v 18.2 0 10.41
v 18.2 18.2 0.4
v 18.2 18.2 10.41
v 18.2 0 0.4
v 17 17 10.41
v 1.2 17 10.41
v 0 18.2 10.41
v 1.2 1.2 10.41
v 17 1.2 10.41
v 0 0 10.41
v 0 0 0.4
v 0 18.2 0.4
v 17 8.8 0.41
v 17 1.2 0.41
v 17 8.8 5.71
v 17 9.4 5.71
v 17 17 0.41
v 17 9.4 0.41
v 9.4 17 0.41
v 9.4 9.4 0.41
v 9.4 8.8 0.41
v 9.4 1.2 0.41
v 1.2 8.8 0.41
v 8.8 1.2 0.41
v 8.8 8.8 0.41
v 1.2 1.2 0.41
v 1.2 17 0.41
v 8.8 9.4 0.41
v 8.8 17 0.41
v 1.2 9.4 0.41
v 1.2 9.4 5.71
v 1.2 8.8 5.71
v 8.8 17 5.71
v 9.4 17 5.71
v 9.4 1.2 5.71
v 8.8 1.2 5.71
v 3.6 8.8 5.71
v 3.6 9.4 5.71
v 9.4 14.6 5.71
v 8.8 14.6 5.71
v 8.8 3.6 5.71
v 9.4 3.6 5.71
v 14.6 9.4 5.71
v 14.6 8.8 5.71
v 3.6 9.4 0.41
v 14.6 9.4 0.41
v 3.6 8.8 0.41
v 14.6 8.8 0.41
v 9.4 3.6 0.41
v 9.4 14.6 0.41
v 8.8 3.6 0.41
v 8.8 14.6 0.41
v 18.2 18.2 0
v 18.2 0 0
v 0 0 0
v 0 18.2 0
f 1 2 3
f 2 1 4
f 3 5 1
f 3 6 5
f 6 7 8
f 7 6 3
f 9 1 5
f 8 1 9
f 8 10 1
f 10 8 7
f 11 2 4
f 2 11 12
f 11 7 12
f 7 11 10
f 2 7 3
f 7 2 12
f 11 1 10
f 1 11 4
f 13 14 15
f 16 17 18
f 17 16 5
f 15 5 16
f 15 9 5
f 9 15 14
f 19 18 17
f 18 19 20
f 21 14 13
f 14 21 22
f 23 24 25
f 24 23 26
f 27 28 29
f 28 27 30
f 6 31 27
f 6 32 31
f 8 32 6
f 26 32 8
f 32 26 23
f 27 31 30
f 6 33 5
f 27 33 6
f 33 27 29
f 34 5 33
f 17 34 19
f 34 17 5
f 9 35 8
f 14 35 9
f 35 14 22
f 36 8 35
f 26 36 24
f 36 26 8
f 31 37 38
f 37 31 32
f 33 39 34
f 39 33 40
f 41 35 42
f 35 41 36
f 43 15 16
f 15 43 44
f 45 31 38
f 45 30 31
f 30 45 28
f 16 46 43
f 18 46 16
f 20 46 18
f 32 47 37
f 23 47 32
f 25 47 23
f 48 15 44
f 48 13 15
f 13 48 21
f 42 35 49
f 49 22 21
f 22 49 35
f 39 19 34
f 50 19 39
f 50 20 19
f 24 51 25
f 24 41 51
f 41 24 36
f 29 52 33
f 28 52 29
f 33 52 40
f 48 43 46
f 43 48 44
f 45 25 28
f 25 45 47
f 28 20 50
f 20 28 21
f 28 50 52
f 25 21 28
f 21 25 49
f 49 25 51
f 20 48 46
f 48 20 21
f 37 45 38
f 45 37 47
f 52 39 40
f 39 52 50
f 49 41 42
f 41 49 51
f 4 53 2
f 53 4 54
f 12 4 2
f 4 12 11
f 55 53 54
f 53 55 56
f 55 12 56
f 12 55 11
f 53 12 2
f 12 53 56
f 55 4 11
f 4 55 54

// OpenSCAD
// file: ../../Base/PlacementOptions.scad
// Fischertechnik Box Foundation
// Placement Options

// Alignment
NoAlign = 0;
AlignLeft = 1;
AlignBottom = 2;
AlignCenter = 3;
AlignRight = 4;
AlignTop = 5;

// Element rotation degree steps
rotations = [0, -90, -180, -270];

// Rotation
NoRotation = 0;
Rotate0 = 0;
Rotate90 = 1;
Rotate180 = 2;
Rotate270 = 3;

// Docking (seen from above)
NoDock = -1;
DockLeft = 0;
DockTop = 1;
DockRight = 2;
DockCorner = 2;
DockBottom = 3;

// Web corners
LowerLeft = 0;
UpperLeft = 1;
UpperRight = 2;
LowerRight = 3;

// Web position relative to corner
LeftOfCorner = 0;
RightOfCorner = 1;
// file: ../../Base/Boxes.scad
// Fischertechnik Box Foundation
// Pre-designed Boxes

use <Constants.scad>

include <PlacementOptions.scad>

box190Width = 190;
box190Depth = 130;
box130Width = 130;
box130Depth = 95;
boxUsageHeight = 33.9;
boxWallThickness = 2.4;
boxBaseThickness = 1.0;
boxWebWidth = 3.0;

// getBoxWallThickness()
// Gets the wall thickness of a Fischertechnik Box

function getBoxWallThickness() = boxWallThickness;

// Gets the usable height of a fischertechnik box
function getBoxUsageHeight() = boxUsageHeight;

// Gets the thickness of the Fischertechnik box base.
function getBoxBaseThickness() = boxBaseThickness;

// Gets the width of a box web
function getBoxWebWidth() = boxWebWidth;

// Gets the usable inner space of a Box 190 as an x/y-list
function getBox190Space() = [
    box190Width - 2*getBoxWallThickness(), 
    box190Depth - 2*getBoxWallThickness() ];

// Imports the Fischertechnik empty box 130x190 mm and places it at position 0,0
// 190x130 are the outer sizes, the inner space is slightly smaller. Use getBox190Space() to get the inner sizes.
// This module needs the STL file "Fischertechnik Box 130x190.stl" in the library path.
// The box is positioned that the usable inner space is at the 0,0,0 position. The

module Box190() {
    translate([-getBoxWallThickness(),-getBoxWallThickness(),-getBoxBaseThickness()])
        import("Fischertechnik Box 130x190.stl", convexity=3);
}

// Gets the usable inner space of a Box 130 as an x/y-list
function getBox130Space() = [
    box130Width - 2*getBoxWallThickness(), 
    box130Depth - 2*getBoxWallThickness() ];

// Imports the Fischertechnik empty box 95x130 mm and places it at position 0,0
// 190x130 are the outer sizes, the inner space is slightly smaller. Use getBox190Space() to get the inner sizes.
// This module needs the STL file "Fischertechnik Box 95x130.stl" in the library path.
// The box is positioned that the usable inner space is at the 0,0,0 position. The

module Box130() {
    translate([-getBoxWallThickness(),-getBoxWallThickness(),-getBoxBaseThickness()])
        import("Fischertechnik Box 95x130.stl", convexity=3);
}

// Creates a web at the specified box walls
// corner 0 = LowerLeft, 1 = UpperLeft, 2 = UpperRight, 3 = LowerRight
// side 0 = LeftOfCorner, 1 = RightOfCorner
// distance = Distance in mm from the corner
// box = inner width and depth of the box (default: Box 190)
// webWidth = length of the web (default is 3 mms)
// webThickness = thickness of the web (default is 1 mm)

module BoxWeb(corner, side, distance, box=getBox190Space(), webWidth=getBoxWebWidth(), webThickness=1.0) {
    sink = getBoxWallThickness()/2;

    width = (corner % 2 == 0) ? 
            (side == LeftOfCorner ? webWidth : webThickness) :
            (side == LeftOfCorner ? webThickness : webWidth);

    depth = (corner % 2 == 0) ? 
            (side == RightOfCorner ? webWidth : webThickness) :
            (side == RightOfCorner ? webThickness : webWidth);
    
    xDiff = corner == LowerLeft ? 
                (side == LeftOfCorner ? -sink : distance) :
            (corner == UpperLeft ?                
                (side == LeftOfCorner ? distance : -sink) :
            (corner == UpperRight ?
                (side == LeftOfCorner ? box.x-webWidth+sink : box.x-distance-webThickness) :
                (side == LeftOfCorner ? box.x-distance-webThickness: box.x-webWidth+sink)));

    yDiff = corner == LowerLeft ? 
                (side == RightOfCorner ? -sink : distance) :
            (corner == UpperLeft ?
                (side == RightOfCorner ? box.y-distance : box.y-webWidth+sink) :
            (corner == UpperRight ?
                (side == RightOfCorner ? box.y-webWidth+sink : box.y-distance) :
                (side == RightOfCorner ? distance : -sink)));
    
    translate([xDiff, yDiff, -getExcess()])
        cube([width, depth, boxUsageHeight + 2*getExcess()]);
}
// file: ../../Base/Rotation.scad
// Fischertechnik Box Foundation
// Geometry Helpers Rotation

include <PlacementOptions.scad>

// getRotatedSpace(space, rotation=NoRotation)
// Rotates the space dependent on the specified rotation

function getRotatedSpace(space, rotation=NoRotation) = [
    (rotation == Rotate90 || rotation == Rotate270) ? space.y : space.x,
    (rotation == Rotate90 || rotation == Rotate270) ? space.x : space.y
];

// Rotates the given space around the fixed left lower corner
// space = the space the children needs as width/depth list [width,depth]
// rotation = 0 Rotate0 degrees, 1 Rotate90 degrees, 2 Rotate180 degrees, 3 Rotate270 degrees (equivalent to -90)

module RotateFix(space, rotation=Rotate0) {
    dy = (rotation == Rotate0 || rotation == Rotate270) ? 0 :
        (rotation == Rotate90) ? space.x :
        space.y;
    dx = (rotation < Rotate180) ? 0 :
        (rotation == Rotate180) ? space.x :
        space.y;
    
    translate([dx, dy, 0])
        rotate([0, 0, rotations[rotation]])
            children();
}
// file: ../../Base/Alignment.scad
// Fischertechnik Box Foundation
// Geometry Helpers Alignment

include <PlacementOptions.scad>

// getAlignedX(elementWidth, spaceWidth, align=AlignRight, offset=0)
// Gets the aligned X offset of an element with the given
// width in the given space.
// elementWidth = The width of the element to positon
// spaceWidth = The space where the element should be aligned
// align = 0 AlignLeft, 1 AlignCenter, 2 AlignRight
// offset = an optional offset from the aligned position. When
// aligned left or centered, then positive values are in X direction.
// When aligned right then positive values are in negative X direction.

function getAlignedX(elementWidth, spaceWidth, align=AlignRight, offset=0) =
    (align == AlignLeft) ?
        offset :
        ((align == AlignCenter) ?
        (spaceWidth - elementWidth)/2 + offset :
        spaceWidth - offset - elementWidth);

// getAlignedY(elementDepth, spaceDepth, align=AlignTop, offset=0)
// Gets the aligned Y offset of an element with the given
// depth in the given space.
// elementDepth = The depth of the element to positon
// spaceDepth = The space where the element should be aligned
// align = 0 AlignBottom, 1 AlignCenter, 2 AlignTop
// offset = an optional offset from the aligned position. When
// aligned bottom or centered, then positive values are in Y direction.
// When aligned top then positive values are in negative Y direction.

function getAlignedY(elementDepth, spaceDepth, align=AlignTop, offset=0) =
    (align == AlignBottom) ?
        offset :
        ((align == AlignCenter) ?
        (spaceDepth - elementDepth)/2 + offset :
        spaceDepth - offset - elementDepth);
// file: ../../Base/Placement.scad
// Fischertechnik Box Foundation
// Geometry Helpers Placement

use <Constants.scad>
use <Alignment.scad>
use <Rotation.scad>
use <Boxes.scad>

include <PlacementOptions.scad>

// Place(x=0, y=0, elementSpace=[0,0], alignX=AlignLeft, alignY=AlignBottom, rotation=Rotate0, boxSpace=getBox190Space())
// Places the child at the specified position
// y = Y-Position. This is a relative position when an X aligment is specified.
// x = X-Position. This is a relative position when an Y aligment is specified.
// elementSpace = space of the element to be placed [x,y]
// alignX = -1=NoAlign, 0 AlignLeft, 1 AlignCenter, 3 AlignRight (elementSpace and boxSpace required!)
// alignY = -1=NoAlign, 2 AlignBottom, 1 AlignCenter, 4 AlignTop (elementSpace and boxSpace required!)
// rotation = 0 Rotate0 0 degrees, 1 Rotate90 90 degrees, 
// 2 Rotate180 180 degrees, 3 Rotate270 270 degrees (equivalent to -90)
// boxSpace = Inner space of the box where the placement occurs [x,y] - default is Box 190x130 inner space

module Place(x=0, y=0, elementSpace=[0,0], 
  alignX=AlignLeft, alignY=AlignBottom, 
  rotation=NoRotation, boxSpace=getBox190Space()) {

    module Position(x, y, space, rotation=Rotate0) {
        translate([x, y, 0])
            RotateFix(space, rotation)
                children();
    }

    space = getRotatedSpace(elementSpace, rotation);
    alignedX = getAlignedX(space.x, boxSpace.x, alignX, x);
    alignedY = getAlignedY(space.y, boxSpace.y, alignY, y);
    Position(alignedX, alignedY, elementSpace, rotation)
        children();
}

// Center(space=getBox130Space(), elementSpace=[0,0])
// space = Space where the children is centered. For cylinder use centered=true and no elementSpace.
// elementSpace = space of the element to be centered [x,y]

module Center(space=getBox190Space(), elementSpace=[0,0]) {
    translate([(space.x - elementSpace.x) / 2, (space.y - elementSpace.y) / 2])
        children(0);
}

// CenterHorizontal(width=0, y=0, offset=0, space=getBox130Space())
// space = Space where the children is centered. For cylinder use centered=true and no elementSpace.
// elementSpace = space of the element to be centered [x,y]

module CenterHorizontal(width=0, y=0, offset=0, space=getBox190Space()) {
    translate([(space.x - width) / 2 + offset, y])
        children(0);
}

// CenterVertical(depth=0, x=0, offset=0, space=getBox130Space())
// space = Space where the children is centered. For cylinder use centered=true and no elementSpace.
// elementSpace = space of the element to be centered [x,y]

module CenterVertical(depth=0, x=0, offset=0, space=getBox190Space()) {
    translate([x, (space.y - depth) / 2 + offset])
        children(0);
}
// file: ../../Elements/AxisClip10.scad
// Fischertechnik Box Library
// Axis for clip 10
// 31023

use <../ModelBase/Simple.scad>

width = 12;
depth = 12;
height = 23;

// getAxisClip10Space()
// Gets the space of a frame for a clip 10 with spring ring (mot2)

function getAxisClip10Space() = [width, depth, height];

// AxisClip10()
// Axis for clip 10 with spring ring (mot2)

module AxisClip10() {
    LeveledAxisWithSpace(height, height-10, getAxisClip10Space());
}

// Tests
color("lightgray")
AxisClip10();
// file: ../../Base/Constants.scad
// Fischertechnik Box Foundation
// Constants

// Constant values necessary for multiple elements

// Base constants
dividerThickness = 1.2;
excess = 0.01;
fragments = 90;
tolerance = 0.8;

// Gets the thickness of a divider 
function getDividerThickness() = dividerThickness;

// Gets the excess that is used to merge walls into each other
function getExcess() = excess;

// Gets amount of fragments of a cylinder
function getFragments() = fragments;

// Gets the inner tolerance of a frame to each side
function getTolerance() = tolerance;


// Fischertechnik specific constants
axisDiameter = 4;
axisBottomDiameter = axisDiameter + 1;
standardEdgeDistance = 2.5;
standardWebDistance = 11.5;
standardCornerLength = 15;
tubeWallFactor = 0.8;

// Gets axis diameter
function getAxisDiameter() = axisDiameter;

// Gets axis bottom diameter for thicker part at the bottom
function getAxisBottomDiameter() = axisBottomDiameter;

// gets the standard distance to the wall of the box for dockable frames with webs
function getStandardEdgeDistance() = standardEdgeDistance;

// gets the standard distance of each web to the corner of the dockable frame
function getStandardWebDistance() = standardWebDistance;

// gets the standard length of the corner walls of a dockable frame
function getStandardCornerLength() = standardCornerLength;

// gets the wall thickness of a tube.
function getTubeWallThickness() = tubeWallFactor * getDividerThickness();
// file: ../../Elements/FrameLightCap.scad
// Fischertechnik Box Library
// Frame for Light Cap
// 31316,31317,31318,31319,31320,31321,31362,36478,36531,36532

use <../Base/Placement.scad>
use <../ModelBase/Simple.scad>

width = 15;
depth = 15;
height = 10;

// getFrameLightCapSpace()
// Gets the space the frame for light cap needs as width (.x and .y as a list)

function getFrameLightCapSpace() = getFrameOuterVolume([width, depth, height]);

// FrameBlockWithPin(count)
// Frame for count standing building blocks with pin down

module FrameLightCap() {    
    webThickness = 0.6;
    webDepth = 2;
    webHeight = 5.3;
    
    innerVolume = getFrameInnerVolume([width, depth, height]);

    module InnerFrame() {
        Frame([width, depth, height]);
        
        Center(getFrameLightCapSpace(), [getFrameLightCapSpace().x, webThickness])
            Wall([getFrameLightCapSpace().x, webThickness, webHeight]);
        Center(getFrameLightCapSpace(), [webThickness, getFrameLightCapSpace().y])
            Wall([webThickness, getFrameLightCapSpace().y, webHeight]);
    }

    difference() {
        InnerFrame();
    
        cutoffWidth = width - 2*webDepth;
        cutoffDepth = depth - 2*webDepth;
        
        Center(getFrameLightCapSpace(), [cutoffWidth, cutoffDepth])
            cube([cutoffWidth, cutoffDepth, height]);
    }
}

// Test
color("lightgray") {
    FrameLightCap();
}
// file: ../TestPrint.scad
// 3D Print Test Base

use <../Base/Constants.scad>

use <../Elements/AxisClip10.scad>

module TestPrint(elementSpace) {
    cube([elementSpace.x, elementSpace.y, 0.4]);
    translate([0,0,0.4+getExcess()]) {
        children();
    }
}

TestPrint(getAxisClip10Space())
    AxisClip10();
// main file
// 3D Print Test Base
// FrameLightCap

use <../TestPrint.scad>
use <../../Elements/FrameLightCap.scad>

TestPrint(getFrameLightCapSpace())
    FrameLightCap();
